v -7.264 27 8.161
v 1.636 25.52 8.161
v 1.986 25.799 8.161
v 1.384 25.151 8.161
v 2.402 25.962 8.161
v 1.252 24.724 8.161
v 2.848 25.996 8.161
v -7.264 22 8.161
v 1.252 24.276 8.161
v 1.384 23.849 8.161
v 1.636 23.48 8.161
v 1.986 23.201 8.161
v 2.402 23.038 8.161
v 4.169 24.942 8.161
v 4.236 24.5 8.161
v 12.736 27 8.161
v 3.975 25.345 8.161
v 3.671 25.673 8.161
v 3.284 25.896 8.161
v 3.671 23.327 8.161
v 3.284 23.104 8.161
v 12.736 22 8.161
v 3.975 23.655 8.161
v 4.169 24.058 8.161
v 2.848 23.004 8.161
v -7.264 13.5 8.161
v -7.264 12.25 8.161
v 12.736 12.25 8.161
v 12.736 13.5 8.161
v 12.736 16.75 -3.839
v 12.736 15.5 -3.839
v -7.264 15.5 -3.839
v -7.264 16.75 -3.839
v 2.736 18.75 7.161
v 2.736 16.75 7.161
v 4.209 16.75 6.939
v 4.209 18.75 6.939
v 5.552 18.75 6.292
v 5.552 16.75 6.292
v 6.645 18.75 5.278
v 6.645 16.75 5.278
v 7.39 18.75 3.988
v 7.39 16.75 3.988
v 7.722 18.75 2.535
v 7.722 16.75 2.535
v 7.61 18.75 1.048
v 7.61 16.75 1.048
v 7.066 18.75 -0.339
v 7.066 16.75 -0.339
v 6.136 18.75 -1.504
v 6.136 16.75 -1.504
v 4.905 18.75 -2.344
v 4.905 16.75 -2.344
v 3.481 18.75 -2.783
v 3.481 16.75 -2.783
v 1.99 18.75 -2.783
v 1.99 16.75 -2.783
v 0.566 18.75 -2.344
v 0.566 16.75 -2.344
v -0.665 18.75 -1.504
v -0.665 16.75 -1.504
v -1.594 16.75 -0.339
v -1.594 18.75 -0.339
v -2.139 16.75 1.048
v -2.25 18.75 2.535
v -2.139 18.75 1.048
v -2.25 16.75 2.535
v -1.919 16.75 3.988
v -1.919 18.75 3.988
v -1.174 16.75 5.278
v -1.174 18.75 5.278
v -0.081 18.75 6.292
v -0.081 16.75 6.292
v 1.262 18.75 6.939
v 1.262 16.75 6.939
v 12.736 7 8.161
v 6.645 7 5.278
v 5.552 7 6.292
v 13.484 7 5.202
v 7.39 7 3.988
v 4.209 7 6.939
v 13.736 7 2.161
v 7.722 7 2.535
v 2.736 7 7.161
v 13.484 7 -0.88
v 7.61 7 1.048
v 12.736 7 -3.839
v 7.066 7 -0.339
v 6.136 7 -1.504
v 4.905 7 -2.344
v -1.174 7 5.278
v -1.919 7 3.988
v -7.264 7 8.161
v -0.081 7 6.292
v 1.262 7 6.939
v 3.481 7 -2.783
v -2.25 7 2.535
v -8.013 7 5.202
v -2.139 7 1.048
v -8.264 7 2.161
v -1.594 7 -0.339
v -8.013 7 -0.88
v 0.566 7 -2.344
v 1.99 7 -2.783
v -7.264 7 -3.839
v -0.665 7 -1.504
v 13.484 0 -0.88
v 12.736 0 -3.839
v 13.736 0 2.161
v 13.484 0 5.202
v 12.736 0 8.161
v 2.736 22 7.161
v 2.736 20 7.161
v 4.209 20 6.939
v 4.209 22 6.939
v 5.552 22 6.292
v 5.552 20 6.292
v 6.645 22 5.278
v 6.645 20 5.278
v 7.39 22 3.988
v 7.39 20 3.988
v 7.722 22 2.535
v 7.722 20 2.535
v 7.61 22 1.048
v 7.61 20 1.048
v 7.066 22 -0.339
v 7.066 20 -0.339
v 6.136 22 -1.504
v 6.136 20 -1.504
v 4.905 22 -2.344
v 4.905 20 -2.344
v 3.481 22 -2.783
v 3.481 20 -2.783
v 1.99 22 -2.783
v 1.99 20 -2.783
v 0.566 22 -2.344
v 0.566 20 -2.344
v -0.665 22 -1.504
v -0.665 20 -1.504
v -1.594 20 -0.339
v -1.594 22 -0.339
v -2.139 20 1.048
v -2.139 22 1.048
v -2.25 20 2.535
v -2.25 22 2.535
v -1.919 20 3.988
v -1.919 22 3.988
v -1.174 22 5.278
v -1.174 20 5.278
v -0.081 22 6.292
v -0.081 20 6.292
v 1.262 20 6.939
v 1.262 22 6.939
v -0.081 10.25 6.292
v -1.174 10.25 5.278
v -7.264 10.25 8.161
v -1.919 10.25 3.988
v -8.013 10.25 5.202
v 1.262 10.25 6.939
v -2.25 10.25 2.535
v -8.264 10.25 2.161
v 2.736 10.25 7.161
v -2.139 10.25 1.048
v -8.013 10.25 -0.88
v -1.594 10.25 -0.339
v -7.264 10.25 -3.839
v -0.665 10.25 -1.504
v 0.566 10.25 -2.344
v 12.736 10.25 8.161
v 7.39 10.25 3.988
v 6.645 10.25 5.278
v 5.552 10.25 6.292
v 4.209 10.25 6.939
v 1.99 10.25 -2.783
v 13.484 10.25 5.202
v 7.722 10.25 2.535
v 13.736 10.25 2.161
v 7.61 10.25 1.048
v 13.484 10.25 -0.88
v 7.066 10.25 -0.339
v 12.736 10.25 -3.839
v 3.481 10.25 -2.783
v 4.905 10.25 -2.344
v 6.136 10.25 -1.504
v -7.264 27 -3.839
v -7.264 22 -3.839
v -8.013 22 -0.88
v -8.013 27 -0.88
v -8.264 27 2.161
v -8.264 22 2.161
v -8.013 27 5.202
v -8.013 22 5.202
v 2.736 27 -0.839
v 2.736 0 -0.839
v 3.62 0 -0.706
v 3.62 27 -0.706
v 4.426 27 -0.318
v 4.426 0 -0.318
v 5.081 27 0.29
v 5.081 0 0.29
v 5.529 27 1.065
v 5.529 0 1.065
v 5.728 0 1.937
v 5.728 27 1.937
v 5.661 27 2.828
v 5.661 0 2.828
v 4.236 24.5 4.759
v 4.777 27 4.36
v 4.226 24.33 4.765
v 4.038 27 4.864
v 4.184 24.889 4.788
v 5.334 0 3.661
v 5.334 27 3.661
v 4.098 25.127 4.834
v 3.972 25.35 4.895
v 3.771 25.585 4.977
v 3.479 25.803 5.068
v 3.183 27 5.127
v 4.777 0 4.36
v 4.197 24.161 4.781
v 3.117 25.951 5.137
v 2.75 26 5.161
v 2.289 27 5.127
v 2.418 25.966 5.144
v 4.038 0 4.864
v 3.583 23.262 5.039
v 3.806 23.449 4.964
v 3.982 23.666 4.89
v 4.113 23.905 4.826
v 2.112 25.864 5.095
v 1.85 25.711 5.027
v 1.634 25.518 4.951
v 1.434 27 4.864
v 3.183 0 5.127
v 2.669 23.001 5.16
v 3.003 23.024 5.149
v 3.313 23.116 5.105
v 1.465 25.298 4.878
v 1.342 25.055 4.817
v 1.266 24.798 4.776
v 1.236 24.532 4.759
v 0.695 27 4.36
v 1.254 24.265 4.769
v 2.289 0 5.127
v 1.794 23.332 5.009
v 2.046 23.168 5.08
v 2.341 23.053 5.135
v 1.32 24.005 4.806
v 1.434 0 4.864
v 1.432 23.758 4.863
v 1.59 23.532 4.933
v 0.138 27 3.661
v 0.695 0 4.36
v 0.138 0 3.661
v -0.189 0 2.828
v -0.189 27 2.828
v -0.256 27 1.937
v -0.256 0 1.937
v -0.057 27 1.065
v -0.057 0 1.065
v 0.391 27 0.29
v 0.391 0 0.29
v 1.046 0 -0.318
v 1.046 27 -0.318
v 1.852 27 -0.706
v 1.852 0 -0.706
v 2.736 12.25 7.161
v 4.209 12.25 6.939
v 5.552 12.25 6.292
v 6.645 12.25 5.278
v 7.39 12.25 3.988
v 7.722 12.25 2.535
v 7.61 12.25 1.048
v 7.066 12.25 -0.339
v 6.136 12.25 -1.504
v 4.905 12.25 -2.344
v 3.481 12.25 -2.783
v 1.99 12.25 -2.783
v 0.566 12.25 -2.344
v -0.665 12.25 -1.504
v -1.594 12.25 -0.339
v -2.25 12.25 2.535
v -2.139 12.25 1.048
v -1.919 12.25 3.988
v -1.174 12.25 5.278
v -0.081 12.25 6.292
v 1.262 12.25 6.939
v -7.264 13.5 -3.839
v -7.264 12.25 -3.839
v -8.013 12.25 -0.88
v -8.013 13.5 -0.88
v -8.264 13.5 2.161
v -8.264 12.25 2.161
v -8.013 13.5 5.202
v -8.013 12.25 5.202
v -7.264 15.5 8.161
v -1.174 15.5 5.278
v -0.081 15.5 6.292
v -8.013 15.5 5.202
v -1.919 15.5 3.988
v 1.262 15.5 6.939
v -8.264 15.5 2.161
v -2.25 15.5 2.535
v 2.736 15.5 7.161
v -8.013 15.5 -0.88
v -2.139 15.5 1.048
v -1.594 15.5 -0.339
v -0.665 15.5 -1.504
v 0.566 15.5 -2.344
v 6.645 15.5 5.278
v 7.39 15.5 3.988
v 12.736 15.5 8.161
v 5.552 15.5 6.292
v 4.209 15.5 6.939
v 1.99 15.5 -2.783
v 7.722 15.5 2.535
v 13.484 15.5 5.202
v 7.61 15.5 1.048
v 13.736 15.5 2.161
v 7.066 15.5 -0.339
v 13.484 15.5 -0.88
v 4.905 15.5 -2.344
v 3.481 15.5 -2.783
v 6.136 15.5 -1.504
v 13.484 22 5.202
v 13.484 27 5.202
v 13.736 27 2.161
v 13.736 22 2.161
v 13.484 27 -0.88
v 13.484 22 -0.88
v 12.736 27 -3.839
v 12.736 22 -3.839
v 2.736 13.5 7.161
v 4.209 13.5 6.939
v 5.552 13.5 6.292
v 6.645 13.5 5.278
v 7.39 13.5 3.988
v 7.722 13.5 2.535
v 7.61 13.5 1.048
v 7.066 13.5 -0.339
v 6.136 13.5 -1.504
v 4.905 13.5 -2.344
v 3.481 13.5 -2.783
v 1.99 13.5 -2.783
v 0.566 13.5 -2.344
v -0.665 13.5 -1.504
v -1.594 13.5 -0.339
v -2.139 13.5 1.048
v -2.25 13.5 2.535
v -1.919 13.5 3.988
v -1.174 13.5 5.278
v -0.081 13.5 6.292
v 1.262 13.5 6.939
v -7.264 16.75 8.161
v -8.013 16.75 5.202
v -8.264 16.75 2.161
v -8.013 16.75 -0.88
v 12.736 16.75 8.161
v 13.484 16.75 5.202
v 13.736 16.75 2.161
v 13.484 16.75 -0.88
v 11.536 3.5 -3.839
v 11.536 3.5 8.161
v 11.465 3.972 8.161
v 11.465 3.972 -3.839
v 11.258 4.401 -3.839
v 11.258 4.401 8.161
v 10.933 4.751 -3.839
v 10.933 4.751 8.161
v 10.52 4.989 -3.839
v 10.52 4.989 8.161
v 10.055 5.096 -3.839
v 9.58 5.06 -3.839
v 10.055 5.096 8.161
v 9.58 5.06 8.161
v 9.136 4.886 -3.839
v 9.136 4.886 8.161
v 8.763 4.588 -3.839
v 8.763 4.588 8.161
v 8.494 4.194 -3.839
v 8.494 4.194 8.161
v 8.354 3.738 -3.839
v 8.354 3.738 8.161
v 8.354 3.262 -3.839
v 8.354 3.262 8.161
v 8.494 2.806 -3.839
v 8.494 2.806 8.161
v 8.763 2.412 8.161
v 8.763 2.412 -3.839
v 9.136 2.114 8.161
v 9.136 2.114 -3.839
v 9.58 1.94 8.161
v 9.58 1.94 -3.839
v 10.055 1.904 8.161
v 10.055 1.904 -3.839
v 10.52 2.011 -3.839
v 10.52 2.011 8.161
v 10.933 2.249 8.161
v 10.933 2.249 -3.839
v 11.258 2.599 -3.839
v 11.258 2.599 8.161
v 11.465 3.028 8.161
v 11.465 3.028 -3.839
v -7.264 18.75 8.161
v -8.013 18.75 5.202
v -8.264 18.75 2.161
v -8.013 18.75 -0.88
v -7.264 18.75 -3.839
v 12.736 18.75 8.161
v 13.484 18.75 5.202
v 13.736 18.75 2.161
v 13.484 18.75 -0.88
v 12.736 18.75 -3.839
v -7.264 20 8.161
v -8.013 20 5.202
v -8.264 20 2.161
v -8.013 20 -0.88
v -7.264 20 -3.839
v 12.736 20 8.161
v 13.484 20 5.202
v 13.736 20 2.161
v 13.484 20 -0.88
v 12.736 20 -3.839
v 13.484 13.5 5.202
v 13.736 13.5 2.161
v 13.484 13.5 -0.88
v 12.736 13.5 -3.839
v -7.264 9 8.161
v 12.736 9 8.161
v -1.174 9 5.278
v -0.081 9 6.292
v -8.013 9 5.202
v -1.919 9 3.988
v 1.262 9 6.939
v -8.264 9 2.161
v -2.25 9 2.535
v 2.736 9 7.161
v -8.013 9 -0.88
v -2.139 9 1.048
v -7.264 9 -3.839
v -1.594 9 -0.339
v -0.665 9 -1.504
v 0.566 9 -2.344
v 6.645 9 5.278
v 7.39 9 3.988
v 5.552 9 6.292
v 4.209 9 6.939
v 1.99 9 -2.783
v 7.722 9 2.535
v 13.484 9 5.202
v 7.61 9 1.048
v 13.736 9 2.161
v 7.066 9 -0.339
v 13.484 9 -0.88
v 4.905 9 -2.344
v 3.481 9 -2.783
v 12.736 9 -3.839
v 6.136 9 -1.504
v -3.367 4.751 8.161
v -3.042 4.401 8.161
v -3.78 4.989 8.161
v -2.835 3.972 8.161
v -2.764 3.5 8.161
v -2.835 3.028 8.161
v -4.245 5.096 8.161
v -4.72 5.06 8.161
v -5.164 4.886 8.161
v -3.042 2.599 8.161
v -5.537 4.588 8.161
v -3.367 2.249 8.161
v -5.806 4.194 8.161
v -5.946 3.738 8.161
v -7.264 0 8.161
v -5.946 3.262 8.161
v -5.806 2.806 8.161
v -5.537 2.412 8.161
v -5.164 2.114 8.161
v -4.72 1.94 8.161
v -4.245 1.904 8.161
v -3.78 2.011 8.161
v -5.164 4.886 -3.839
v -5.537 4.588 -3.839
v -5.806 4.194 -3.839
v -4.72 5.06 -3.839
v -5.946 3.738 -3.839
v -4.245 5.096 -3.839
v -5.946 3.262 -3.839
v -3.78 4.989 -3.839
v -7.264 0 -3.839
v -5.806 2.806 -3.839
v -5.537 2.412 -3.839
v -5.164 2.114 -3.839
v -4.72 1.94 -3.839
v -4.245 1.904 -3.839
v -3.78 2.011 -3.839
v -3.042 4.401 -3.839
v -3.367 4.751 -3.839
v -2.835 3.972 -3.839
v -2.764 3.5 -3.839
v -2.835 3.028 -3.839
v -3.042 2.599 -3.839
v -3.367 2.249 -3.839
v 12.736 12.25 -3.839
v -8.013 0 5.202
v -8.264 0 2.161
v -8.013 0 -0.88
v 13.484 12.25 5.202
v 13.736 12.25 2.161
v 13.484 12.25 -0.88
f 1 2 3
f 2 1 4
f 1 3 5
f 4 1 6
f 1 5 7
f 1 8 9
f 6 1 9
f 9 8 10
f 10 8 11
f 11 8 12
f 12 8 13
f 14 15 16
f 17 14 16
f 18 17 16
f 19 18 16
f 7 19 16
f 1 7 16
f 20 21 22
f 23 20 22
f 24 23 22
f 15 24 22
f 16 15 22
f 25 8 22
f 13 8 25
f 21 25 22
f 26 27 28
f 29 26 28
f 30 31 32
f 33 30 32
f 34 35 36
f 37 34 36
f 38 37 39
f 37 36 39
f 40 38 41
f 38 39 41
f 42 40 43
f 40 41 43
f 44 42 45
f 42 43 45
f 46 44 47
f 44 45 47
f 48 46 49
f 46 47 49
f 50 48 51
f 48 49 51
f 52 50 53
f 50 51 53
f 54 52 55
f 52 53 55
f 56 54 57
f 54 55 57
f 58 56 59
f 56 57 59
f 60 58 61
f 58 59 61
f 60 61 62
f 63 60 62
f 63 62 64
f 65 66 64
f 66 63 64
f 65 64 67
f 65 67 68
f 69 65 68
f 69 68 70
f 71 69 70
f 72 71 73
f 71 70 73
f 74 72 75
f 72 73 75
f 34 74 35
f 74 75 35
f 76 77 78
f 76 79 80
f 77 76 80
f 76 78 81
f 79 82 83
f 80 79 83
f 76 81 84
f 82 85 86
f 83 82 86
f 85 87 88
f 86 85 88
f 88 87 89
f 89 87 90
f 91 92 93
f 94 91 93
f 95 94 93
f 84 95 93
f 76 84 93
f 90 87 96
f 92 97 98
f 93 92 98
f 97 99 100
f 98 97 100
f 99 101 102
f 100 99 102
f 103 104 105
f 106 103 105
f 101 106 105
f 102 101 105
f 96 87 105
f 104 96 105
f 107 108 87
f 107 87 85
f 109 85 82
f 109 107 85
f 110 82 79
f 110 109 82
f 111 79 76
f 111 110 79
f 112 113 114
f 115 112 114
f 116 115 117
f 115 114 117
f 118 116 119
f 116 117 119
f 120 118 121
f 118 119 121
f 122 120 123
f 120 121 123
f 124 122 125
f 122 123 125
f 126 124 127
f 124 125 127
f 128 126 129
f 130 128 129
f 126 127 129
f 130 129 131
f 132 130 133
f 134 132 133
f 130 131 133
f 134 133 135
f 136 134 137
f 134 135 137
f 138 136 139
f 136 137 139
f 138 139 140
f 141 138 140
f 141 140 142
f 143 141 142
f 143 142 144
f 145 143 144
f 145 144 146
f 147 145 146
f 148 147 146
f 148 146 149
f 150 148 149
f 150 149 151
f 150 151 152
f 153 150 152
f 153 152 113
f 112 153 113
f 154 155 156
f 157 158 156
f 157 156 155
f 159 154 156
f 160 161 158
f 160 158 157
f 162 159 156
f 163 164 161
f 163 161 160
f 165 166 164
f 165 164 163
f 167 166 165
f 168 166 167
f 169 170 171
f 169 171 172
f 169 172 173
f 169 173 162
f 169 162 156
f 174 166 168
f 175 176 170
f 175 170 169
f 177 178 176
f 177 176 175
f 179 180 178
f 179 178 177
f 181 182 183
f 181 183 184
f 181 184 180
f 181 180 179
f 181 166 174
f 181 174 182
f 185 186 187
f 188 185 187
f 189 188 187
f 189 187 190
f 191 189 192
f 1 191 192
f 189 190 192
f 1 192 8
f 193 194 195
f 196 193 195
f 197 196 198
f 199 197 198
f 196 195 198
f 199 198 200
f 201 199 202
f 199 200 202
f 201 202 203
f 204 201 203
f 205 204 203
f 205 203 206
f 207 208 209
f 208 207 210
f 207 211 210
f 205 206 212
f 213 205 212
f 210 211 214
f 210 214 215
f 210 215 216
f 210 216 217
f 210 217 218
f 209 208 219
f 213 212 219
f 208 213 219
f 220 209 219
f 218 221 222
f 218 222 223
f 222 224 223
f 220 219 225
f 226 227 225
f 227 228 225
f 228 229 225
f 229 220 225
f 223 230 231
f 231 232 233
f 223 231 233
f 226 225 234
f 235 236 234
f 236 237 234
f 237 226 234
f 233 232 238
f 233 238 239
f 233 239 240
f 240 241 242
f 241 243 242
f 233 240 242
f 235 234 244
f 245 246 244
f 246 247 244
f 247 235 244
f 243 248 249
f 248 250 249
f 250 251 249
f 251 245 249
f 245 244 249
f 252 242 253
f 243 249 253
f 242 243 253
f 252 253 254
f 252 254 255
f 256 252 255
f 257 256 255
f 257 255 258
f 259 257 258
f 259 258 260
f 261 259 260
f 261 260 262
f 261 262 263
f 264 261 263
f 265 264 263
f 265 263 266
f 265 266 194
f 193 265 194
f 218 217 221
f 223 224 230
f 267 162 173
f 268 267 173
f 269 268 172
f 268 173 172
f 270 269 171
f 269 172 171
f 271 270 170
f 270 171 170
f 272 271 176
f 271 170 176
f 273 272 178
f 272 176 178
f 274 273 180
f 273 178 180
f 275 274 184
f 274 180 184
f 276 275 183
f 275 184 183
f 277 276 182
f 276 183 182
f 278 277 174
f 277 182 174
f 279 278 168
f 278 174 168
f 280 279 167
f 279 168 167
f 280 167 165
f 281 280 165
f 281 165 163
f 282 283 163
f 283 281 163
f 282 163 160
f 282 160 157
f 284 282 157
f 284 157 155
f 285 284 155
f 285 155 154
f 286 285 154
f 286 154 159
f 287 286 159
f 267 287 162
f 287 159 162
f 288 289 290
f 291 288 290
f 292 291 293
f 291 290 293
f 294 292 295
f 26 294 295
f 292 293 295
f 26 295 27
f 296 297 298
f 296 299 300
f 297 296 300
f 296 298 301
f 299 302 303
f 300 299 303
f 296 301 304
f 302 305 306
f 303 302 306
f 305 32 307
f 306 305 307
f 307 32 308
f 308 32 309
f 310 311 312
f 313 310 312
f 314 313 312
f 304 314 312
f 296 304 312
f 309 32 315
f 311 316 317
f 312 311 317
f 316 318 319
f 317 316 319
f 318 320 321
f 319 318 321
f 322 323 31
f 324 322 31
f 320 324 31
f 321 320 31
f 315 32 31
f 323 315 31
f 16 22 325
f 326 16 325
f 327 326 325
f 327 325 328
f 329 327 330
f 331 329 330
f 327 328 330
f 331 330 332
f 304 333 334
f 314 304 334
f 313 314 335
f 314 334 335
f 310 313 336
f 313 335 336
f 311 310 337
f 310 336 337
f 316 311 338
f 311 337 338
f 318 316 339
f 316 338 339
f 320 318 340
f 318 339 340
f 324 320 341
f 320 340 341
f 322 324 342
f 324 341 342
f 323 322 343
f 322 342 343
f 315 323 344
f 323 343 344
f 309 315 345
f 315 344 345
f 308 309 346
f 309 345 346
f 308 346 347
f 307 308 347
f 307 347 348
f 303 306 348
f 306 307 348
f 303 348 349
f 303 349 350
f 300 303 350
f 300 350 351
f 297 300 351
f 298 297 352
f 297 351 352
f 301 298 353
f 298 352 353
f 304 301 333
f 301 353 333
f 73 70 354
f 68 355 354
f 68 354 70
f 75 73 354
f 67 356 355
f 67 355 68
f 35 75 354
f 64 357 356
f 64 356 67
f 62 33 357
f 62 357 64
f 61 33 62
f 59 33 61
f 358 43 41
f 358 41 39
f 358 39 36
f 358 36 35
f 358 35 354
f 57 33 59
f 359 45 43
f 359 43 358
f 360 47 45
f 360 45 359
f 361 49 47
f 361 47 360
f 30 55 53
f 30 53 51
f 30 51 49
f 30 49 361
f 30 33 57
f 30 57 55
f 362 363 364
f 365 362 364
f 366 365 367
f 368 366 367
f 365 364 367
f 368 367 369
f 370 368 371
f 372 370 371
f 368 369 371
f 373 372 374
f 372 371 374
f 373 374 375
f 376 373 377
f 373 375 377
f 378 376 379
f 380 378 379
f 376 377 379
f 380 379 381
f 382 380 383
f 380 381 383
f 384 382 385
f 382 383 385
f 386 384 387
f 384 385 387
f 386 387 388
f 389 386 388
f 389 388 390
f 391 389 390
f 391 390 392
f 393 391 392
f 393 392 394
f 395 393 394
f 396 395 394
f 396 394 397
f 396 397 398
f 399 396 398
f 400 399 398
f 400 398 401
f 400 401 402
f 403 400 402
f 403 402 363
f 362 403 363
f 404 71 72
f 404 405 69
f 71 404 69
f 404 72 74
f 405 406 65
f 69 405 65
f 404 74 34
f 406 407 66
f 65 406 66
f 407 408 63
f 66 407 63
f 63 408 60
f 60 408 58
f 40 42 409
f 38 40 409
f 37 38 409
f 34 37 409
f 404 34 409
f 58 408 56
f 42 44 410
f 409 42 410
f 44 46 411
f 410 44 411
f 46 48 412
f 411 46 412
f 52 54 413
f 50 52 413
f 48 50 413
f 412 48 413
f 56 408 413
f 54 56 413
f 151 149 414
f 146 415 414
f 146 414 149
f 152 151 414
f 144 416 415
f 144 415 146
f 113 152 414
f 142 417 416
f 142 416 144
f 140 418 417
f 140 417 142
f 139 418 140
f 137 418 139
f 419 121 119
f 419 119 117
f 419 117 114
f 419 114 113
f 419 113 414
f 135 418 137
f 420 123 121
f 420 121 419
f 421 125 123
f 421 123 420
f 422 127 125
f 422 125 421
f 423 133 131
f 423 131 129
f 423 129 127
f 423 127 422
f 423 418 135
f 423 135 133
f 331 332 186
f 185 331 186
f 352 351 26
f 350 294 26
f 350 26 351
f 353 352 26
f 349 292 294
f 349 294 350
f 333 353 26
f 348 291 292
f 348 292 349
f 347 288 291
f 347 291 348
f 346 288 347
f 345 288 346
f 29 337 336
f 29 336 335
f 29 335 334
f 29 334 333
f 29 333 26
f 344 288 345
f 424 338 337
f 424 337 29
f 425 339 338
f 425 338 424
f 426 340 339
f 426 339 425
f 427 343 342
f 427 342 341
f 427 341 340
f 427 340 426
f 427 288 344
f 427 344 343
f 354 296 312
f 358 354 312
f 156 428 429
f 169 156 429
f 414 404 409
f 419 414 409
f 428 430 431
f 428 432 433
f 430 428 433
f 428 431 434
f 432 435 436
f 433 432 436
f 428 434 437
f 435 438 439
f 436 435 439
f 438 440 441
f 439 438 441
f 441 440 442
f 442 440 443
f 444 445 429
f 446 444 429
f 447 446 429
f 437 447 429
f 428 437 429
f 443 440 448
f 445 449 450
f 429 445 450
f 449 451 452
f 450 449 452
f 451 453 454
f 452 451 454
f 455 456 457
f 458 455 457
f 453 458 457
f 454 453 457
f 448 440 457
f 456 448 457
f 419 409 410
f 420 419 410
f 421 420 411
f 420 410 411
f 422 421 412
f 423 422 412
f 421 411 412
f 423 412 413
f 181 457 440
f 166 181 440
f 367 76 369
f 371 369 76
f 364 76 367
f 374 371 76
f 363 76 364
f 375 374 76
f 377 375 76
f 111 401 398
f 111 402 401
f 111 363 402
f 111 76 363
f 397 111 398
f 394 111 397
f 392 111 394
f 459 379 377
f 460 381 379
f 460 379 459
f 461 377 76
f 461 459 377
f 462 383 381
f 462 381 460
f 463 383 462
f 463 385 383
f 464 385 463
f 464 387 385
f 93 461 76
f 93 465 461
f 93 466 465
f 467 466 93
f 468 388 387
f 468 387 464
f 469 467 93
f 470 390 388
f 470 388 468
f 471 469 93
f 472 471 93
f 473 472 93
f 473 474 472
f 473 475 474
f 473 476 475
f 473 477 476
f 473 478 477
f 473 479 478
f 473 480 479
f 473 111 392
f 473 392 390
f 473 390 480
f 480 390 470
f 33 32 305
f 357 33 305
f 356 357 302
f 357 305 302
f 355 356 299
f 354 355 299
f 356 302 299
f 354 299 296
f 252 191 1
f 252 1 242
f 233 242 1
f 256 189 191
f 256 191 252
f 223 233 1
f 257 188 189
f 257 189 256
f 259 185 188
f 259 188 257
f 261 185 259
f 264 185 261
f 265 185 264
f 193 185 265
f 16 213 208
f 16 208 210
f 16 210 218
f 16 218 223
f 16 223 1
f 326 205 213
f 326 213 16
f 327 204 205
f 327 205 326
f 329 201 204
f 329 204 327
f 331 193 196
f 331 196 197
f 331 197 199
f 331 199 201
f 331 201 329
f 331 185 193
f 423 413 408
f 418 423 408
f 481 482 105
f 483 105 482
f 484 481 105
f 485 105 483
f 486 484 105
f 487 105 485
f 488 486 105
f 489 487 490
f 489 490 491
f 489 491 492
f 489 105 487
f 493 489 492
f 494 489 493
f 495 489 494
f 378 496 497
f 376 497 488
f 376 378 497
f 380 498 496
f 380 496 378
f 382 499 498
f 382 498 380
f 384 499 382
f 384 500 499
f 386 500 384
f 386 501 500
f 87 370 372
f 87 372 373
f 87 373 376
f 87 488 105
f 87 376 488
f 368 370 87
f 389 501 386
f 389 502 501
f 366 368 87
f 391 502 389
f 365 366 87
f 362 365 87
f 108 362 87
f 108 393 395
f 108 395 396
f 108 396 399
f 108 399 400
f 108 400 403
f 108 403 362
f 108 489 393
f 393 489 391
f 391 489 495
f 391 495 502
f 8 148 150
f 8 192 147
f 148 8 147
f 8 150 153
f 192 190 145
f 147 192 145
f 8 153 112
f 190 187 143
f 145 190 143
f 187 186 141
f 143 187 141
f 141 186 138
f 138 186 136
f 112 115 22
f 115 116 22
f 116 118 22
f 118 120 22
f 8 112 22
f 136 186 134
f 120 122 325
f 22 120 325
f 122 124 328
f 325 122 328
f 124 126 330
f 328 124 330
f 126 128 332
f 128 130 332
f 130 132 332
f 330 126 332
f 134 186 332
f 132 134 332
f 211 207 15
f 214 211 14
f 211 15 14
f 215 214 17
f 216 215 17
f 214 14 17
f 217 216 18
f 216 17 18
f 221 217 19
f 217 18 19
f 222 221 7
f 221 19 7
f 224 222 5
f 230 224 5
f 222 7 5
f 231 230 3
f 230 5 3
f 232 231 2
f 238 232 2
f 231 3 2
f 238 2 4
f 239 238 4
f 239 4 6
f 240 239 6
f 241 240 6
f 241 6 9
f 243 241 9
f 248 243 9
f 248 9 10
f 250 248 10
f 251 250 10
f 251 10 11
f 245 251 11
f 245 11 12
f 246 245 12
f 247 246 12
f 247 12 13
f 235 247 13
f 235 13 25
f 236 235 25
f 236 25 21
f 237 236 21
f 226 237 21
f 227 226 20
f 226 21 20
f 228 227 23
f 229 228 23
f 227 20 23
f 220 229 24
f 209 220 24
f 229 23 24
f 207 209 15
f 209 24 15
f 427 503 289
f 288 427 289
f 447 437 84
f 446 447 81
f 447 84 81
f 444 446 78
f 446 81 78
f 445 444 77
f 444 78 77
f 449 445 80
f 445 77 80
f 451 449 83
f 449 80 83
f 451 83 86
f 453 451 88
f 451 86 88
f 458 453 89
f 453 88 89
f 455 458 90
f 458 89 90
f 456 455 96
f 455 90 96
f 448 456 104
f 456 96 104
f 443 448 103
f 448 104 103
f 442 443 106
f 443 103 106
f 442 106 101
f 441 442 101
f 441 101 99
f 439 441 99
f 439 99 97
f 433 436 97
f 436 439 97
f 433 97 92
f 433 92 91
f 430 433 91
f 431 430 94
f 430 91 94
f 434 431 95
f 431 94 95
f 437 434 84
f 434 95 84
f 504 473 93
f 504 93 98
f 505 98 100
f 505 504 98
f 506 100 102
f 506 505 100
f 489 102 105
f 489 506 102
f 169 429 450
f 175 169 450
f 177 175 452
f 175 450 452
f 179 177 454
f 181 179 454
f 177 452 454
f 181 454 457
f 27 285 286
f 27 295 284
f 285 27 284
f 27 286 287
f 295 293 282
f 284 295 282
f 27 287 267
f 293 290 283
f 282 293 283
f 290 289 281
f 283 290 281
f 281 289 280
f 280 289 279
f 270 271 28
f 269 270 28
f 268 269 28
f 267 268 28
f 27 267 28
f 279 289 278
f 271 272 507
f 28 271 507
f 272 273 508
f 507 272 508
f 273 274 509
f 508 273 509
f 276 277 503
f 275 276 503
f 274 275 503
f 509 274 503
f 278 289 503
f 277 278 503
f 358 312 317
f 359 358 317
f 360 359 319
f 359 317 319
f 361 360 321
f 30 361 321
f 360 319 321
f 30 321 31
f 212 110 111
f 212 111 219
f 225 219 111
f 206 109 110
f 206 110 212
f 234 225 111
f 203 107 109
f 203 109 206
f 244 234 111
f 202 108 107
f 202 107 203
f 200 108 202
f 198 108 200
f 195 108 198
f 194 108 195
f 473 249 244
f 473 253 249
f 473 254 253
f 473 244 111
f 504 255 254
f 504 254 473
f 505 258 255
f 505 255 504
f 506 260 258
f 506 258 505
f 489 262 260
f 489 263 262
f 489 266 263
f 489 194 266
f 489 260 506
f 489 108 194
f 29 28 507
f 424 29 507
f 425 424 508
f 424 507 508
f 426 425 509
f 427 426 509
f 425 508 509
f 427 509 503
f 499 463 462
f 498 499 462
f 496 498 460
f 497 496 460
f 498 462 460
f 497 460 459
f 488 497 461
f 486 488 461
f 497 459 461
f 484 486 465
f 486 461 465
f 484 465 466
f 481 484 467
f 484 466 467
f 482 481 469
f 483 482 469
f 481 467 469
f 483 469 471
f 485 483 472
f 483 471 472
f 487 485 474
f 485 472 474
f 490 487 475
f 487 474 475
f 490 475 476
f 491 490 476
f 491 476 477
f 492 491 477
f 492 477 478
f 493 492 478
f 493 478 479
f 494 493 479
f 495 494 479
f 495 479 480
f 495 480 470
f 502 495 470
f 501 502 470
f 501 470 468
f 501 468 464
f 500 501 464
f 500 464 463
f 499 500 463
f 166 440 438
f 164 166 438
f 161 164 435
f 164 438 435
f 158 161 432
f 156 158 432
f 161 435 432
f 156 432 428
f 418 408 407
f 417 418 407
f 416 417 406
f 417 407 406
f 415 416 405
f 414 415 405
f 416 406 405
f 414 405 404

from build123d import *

# Parameters (mm, degrees)
EXTRUDE_1_DEPTH        = 7
SKETCH_2_R             = 5
EXTRUDE_2_DEPTH        = 15
EXTRUDE_3_DEPTH        = 1.25
PATTERN_LINEAR_1_COUNT = 4
PATTERN_LINEAR_1_PITCH = 3.25
EXTRUDE_5_DEPTH        = 5
SKETCH_8_R             = 1.6
CUT_EXTRUDE_2_DEPTH    = 33.583240961
SKETCH_9_R             = 1.5
CUT_EXTRUDE_3_DEPTH    = 5
SKETCH_10_R            = 3
CUT_EXTRUDE_4_DEPTH    = 32.373048931


with BuildPart() as part:
    # 草图1 → 凸台-拉伸1 (new body)
    with BuildSketch(Plane(origin=(0, 0, 0), x_dir=(1, 0, 0), z_dir=(0, 1, 0))):
        with BuildLine():
            Line((-7.264367816, 3.83908046), (12.735632184, 3.83908046))
            ThreePointArc((12.735632184, 3.83908046), (13.735632184, -2.16091954), (12.735632184, -8.16091954))
            Line((12.735632184, -8.16091954), (-7.264367816, -8.16091954))
            ThreePointArc((-7.264367816, -8.16091954), (-8.264367816, -2.16091954), (-7.264367816, 3.83908046))
        make_face()
    extrude(amount=EXTRUDE_1_DEPTH)

    # 草图2 → 凸台-拉伸2 (add)
    with BuildSketch(Plane(origin=(0, 7, 0), x_dir=(1, 0, 0), z_dir=(0, 1, 0))):
        with Locations(Location((2.735632184, -2.16091954, 0), (0, 0, 270))):
            Circle(SKETCH_2_R)
    extrude(amount=EXTRUDE_2_DEPTH)

    # 草图4 → 凸台-拉伸3 (add)
    with BuildSketch(Plane(origin=(0, 9, 0), x_dir=(1, 0, 0), z_dir=(0, 1, 0))):
        with BuildLine():
            Line((-7.264367816, -8.16091954), (12.735632184, -8.16091954))
            ThreePointArc((12.735632184, -8.16091954), (13.735632184, -2.16091954), (12.735632184, 3.83908046))
            Line((12.735632184, 3.83908046), (-7.264367816, 3.83908046))
            ThreePointArc((-7.264367816, 3.83908046), (-8.264367816, -2.16091954), (-7.264367816, -8.16091954))
        make_face()
    extrude_3 = extrude(amount=EXTRUDE_3_DEPTH)

    # 阵列(线性)1: 凸台-拉伸3 ×4
    with Locations(*[(0, i * PATTERN_LINEAR_1_PITCH, 0) for i in range(1, PATTERN_LINEAR_1_COUNT)]):
        add(extrude_3)

    # 草图6 → 凸台-拉伸5 (add)
    with BuildSketch(Plane(origin=(0, 22, 0), x_dir=(1, 0, 0), z_dir=(0, 1, 0))):
        with BuildLine():
            Line((12.735632184, 3.83908046), (-7.264367816, 3.83908046))
            ThreePointArc((-7.264367816, 3.83908046), (-8.264367816, -2.16091954), (-7.264367816, -8.16091954))
            Line((-7.264367816, -8.16091954), (12.735632184, -8.16091954))
            ThreePointArc((12.735632184, -8.16091954), (13.735632184, -2.16091954), (12.735632184, 3.83908046))
        make_face()
    extrude(amount=EXTRUDE_5_DEPTH)

    # 草图8 → 切除-拉伸2 (cut, through all)
    with BuildSketch(Plane.XY.offset(8.16091954)):
        with Locations((-4.364367816, 3.5)):
            Circle(SKETCH_8_R)
        with Locations((9.935632184, 3.5)):
            Circle(SKETCH_8_R)
    extrude(amount=-CUT_EXTRUDE_2_DEPTH, mode=Mode.SUBTRACT)

    # 草图9 → 切除-拉伸3 (cut)
    with BuildSketch(Plane.XY.offset(8.16091954)):
        with Locations((2.735632184, 24.5)):
            Circle(SKETCH_9_R)
    extrude(amount=-CUT_EXTRUDE_3_DEPTH, mode=Mode.SUBTRACT)

    # 草图10 → 切除-拉伸4 (cut, through all)
    with BuildSketch(Plane.XZ):
        with Locations(Location((2.735995225, 2.16091954, 0), (0, 0, 270))):
            Circle(SKETCH_10_R)
    extrude(amount=-CUT_EXTRUDE_4_DEPTH, mode=Mode.SUBTRACT)


solid = part.part
